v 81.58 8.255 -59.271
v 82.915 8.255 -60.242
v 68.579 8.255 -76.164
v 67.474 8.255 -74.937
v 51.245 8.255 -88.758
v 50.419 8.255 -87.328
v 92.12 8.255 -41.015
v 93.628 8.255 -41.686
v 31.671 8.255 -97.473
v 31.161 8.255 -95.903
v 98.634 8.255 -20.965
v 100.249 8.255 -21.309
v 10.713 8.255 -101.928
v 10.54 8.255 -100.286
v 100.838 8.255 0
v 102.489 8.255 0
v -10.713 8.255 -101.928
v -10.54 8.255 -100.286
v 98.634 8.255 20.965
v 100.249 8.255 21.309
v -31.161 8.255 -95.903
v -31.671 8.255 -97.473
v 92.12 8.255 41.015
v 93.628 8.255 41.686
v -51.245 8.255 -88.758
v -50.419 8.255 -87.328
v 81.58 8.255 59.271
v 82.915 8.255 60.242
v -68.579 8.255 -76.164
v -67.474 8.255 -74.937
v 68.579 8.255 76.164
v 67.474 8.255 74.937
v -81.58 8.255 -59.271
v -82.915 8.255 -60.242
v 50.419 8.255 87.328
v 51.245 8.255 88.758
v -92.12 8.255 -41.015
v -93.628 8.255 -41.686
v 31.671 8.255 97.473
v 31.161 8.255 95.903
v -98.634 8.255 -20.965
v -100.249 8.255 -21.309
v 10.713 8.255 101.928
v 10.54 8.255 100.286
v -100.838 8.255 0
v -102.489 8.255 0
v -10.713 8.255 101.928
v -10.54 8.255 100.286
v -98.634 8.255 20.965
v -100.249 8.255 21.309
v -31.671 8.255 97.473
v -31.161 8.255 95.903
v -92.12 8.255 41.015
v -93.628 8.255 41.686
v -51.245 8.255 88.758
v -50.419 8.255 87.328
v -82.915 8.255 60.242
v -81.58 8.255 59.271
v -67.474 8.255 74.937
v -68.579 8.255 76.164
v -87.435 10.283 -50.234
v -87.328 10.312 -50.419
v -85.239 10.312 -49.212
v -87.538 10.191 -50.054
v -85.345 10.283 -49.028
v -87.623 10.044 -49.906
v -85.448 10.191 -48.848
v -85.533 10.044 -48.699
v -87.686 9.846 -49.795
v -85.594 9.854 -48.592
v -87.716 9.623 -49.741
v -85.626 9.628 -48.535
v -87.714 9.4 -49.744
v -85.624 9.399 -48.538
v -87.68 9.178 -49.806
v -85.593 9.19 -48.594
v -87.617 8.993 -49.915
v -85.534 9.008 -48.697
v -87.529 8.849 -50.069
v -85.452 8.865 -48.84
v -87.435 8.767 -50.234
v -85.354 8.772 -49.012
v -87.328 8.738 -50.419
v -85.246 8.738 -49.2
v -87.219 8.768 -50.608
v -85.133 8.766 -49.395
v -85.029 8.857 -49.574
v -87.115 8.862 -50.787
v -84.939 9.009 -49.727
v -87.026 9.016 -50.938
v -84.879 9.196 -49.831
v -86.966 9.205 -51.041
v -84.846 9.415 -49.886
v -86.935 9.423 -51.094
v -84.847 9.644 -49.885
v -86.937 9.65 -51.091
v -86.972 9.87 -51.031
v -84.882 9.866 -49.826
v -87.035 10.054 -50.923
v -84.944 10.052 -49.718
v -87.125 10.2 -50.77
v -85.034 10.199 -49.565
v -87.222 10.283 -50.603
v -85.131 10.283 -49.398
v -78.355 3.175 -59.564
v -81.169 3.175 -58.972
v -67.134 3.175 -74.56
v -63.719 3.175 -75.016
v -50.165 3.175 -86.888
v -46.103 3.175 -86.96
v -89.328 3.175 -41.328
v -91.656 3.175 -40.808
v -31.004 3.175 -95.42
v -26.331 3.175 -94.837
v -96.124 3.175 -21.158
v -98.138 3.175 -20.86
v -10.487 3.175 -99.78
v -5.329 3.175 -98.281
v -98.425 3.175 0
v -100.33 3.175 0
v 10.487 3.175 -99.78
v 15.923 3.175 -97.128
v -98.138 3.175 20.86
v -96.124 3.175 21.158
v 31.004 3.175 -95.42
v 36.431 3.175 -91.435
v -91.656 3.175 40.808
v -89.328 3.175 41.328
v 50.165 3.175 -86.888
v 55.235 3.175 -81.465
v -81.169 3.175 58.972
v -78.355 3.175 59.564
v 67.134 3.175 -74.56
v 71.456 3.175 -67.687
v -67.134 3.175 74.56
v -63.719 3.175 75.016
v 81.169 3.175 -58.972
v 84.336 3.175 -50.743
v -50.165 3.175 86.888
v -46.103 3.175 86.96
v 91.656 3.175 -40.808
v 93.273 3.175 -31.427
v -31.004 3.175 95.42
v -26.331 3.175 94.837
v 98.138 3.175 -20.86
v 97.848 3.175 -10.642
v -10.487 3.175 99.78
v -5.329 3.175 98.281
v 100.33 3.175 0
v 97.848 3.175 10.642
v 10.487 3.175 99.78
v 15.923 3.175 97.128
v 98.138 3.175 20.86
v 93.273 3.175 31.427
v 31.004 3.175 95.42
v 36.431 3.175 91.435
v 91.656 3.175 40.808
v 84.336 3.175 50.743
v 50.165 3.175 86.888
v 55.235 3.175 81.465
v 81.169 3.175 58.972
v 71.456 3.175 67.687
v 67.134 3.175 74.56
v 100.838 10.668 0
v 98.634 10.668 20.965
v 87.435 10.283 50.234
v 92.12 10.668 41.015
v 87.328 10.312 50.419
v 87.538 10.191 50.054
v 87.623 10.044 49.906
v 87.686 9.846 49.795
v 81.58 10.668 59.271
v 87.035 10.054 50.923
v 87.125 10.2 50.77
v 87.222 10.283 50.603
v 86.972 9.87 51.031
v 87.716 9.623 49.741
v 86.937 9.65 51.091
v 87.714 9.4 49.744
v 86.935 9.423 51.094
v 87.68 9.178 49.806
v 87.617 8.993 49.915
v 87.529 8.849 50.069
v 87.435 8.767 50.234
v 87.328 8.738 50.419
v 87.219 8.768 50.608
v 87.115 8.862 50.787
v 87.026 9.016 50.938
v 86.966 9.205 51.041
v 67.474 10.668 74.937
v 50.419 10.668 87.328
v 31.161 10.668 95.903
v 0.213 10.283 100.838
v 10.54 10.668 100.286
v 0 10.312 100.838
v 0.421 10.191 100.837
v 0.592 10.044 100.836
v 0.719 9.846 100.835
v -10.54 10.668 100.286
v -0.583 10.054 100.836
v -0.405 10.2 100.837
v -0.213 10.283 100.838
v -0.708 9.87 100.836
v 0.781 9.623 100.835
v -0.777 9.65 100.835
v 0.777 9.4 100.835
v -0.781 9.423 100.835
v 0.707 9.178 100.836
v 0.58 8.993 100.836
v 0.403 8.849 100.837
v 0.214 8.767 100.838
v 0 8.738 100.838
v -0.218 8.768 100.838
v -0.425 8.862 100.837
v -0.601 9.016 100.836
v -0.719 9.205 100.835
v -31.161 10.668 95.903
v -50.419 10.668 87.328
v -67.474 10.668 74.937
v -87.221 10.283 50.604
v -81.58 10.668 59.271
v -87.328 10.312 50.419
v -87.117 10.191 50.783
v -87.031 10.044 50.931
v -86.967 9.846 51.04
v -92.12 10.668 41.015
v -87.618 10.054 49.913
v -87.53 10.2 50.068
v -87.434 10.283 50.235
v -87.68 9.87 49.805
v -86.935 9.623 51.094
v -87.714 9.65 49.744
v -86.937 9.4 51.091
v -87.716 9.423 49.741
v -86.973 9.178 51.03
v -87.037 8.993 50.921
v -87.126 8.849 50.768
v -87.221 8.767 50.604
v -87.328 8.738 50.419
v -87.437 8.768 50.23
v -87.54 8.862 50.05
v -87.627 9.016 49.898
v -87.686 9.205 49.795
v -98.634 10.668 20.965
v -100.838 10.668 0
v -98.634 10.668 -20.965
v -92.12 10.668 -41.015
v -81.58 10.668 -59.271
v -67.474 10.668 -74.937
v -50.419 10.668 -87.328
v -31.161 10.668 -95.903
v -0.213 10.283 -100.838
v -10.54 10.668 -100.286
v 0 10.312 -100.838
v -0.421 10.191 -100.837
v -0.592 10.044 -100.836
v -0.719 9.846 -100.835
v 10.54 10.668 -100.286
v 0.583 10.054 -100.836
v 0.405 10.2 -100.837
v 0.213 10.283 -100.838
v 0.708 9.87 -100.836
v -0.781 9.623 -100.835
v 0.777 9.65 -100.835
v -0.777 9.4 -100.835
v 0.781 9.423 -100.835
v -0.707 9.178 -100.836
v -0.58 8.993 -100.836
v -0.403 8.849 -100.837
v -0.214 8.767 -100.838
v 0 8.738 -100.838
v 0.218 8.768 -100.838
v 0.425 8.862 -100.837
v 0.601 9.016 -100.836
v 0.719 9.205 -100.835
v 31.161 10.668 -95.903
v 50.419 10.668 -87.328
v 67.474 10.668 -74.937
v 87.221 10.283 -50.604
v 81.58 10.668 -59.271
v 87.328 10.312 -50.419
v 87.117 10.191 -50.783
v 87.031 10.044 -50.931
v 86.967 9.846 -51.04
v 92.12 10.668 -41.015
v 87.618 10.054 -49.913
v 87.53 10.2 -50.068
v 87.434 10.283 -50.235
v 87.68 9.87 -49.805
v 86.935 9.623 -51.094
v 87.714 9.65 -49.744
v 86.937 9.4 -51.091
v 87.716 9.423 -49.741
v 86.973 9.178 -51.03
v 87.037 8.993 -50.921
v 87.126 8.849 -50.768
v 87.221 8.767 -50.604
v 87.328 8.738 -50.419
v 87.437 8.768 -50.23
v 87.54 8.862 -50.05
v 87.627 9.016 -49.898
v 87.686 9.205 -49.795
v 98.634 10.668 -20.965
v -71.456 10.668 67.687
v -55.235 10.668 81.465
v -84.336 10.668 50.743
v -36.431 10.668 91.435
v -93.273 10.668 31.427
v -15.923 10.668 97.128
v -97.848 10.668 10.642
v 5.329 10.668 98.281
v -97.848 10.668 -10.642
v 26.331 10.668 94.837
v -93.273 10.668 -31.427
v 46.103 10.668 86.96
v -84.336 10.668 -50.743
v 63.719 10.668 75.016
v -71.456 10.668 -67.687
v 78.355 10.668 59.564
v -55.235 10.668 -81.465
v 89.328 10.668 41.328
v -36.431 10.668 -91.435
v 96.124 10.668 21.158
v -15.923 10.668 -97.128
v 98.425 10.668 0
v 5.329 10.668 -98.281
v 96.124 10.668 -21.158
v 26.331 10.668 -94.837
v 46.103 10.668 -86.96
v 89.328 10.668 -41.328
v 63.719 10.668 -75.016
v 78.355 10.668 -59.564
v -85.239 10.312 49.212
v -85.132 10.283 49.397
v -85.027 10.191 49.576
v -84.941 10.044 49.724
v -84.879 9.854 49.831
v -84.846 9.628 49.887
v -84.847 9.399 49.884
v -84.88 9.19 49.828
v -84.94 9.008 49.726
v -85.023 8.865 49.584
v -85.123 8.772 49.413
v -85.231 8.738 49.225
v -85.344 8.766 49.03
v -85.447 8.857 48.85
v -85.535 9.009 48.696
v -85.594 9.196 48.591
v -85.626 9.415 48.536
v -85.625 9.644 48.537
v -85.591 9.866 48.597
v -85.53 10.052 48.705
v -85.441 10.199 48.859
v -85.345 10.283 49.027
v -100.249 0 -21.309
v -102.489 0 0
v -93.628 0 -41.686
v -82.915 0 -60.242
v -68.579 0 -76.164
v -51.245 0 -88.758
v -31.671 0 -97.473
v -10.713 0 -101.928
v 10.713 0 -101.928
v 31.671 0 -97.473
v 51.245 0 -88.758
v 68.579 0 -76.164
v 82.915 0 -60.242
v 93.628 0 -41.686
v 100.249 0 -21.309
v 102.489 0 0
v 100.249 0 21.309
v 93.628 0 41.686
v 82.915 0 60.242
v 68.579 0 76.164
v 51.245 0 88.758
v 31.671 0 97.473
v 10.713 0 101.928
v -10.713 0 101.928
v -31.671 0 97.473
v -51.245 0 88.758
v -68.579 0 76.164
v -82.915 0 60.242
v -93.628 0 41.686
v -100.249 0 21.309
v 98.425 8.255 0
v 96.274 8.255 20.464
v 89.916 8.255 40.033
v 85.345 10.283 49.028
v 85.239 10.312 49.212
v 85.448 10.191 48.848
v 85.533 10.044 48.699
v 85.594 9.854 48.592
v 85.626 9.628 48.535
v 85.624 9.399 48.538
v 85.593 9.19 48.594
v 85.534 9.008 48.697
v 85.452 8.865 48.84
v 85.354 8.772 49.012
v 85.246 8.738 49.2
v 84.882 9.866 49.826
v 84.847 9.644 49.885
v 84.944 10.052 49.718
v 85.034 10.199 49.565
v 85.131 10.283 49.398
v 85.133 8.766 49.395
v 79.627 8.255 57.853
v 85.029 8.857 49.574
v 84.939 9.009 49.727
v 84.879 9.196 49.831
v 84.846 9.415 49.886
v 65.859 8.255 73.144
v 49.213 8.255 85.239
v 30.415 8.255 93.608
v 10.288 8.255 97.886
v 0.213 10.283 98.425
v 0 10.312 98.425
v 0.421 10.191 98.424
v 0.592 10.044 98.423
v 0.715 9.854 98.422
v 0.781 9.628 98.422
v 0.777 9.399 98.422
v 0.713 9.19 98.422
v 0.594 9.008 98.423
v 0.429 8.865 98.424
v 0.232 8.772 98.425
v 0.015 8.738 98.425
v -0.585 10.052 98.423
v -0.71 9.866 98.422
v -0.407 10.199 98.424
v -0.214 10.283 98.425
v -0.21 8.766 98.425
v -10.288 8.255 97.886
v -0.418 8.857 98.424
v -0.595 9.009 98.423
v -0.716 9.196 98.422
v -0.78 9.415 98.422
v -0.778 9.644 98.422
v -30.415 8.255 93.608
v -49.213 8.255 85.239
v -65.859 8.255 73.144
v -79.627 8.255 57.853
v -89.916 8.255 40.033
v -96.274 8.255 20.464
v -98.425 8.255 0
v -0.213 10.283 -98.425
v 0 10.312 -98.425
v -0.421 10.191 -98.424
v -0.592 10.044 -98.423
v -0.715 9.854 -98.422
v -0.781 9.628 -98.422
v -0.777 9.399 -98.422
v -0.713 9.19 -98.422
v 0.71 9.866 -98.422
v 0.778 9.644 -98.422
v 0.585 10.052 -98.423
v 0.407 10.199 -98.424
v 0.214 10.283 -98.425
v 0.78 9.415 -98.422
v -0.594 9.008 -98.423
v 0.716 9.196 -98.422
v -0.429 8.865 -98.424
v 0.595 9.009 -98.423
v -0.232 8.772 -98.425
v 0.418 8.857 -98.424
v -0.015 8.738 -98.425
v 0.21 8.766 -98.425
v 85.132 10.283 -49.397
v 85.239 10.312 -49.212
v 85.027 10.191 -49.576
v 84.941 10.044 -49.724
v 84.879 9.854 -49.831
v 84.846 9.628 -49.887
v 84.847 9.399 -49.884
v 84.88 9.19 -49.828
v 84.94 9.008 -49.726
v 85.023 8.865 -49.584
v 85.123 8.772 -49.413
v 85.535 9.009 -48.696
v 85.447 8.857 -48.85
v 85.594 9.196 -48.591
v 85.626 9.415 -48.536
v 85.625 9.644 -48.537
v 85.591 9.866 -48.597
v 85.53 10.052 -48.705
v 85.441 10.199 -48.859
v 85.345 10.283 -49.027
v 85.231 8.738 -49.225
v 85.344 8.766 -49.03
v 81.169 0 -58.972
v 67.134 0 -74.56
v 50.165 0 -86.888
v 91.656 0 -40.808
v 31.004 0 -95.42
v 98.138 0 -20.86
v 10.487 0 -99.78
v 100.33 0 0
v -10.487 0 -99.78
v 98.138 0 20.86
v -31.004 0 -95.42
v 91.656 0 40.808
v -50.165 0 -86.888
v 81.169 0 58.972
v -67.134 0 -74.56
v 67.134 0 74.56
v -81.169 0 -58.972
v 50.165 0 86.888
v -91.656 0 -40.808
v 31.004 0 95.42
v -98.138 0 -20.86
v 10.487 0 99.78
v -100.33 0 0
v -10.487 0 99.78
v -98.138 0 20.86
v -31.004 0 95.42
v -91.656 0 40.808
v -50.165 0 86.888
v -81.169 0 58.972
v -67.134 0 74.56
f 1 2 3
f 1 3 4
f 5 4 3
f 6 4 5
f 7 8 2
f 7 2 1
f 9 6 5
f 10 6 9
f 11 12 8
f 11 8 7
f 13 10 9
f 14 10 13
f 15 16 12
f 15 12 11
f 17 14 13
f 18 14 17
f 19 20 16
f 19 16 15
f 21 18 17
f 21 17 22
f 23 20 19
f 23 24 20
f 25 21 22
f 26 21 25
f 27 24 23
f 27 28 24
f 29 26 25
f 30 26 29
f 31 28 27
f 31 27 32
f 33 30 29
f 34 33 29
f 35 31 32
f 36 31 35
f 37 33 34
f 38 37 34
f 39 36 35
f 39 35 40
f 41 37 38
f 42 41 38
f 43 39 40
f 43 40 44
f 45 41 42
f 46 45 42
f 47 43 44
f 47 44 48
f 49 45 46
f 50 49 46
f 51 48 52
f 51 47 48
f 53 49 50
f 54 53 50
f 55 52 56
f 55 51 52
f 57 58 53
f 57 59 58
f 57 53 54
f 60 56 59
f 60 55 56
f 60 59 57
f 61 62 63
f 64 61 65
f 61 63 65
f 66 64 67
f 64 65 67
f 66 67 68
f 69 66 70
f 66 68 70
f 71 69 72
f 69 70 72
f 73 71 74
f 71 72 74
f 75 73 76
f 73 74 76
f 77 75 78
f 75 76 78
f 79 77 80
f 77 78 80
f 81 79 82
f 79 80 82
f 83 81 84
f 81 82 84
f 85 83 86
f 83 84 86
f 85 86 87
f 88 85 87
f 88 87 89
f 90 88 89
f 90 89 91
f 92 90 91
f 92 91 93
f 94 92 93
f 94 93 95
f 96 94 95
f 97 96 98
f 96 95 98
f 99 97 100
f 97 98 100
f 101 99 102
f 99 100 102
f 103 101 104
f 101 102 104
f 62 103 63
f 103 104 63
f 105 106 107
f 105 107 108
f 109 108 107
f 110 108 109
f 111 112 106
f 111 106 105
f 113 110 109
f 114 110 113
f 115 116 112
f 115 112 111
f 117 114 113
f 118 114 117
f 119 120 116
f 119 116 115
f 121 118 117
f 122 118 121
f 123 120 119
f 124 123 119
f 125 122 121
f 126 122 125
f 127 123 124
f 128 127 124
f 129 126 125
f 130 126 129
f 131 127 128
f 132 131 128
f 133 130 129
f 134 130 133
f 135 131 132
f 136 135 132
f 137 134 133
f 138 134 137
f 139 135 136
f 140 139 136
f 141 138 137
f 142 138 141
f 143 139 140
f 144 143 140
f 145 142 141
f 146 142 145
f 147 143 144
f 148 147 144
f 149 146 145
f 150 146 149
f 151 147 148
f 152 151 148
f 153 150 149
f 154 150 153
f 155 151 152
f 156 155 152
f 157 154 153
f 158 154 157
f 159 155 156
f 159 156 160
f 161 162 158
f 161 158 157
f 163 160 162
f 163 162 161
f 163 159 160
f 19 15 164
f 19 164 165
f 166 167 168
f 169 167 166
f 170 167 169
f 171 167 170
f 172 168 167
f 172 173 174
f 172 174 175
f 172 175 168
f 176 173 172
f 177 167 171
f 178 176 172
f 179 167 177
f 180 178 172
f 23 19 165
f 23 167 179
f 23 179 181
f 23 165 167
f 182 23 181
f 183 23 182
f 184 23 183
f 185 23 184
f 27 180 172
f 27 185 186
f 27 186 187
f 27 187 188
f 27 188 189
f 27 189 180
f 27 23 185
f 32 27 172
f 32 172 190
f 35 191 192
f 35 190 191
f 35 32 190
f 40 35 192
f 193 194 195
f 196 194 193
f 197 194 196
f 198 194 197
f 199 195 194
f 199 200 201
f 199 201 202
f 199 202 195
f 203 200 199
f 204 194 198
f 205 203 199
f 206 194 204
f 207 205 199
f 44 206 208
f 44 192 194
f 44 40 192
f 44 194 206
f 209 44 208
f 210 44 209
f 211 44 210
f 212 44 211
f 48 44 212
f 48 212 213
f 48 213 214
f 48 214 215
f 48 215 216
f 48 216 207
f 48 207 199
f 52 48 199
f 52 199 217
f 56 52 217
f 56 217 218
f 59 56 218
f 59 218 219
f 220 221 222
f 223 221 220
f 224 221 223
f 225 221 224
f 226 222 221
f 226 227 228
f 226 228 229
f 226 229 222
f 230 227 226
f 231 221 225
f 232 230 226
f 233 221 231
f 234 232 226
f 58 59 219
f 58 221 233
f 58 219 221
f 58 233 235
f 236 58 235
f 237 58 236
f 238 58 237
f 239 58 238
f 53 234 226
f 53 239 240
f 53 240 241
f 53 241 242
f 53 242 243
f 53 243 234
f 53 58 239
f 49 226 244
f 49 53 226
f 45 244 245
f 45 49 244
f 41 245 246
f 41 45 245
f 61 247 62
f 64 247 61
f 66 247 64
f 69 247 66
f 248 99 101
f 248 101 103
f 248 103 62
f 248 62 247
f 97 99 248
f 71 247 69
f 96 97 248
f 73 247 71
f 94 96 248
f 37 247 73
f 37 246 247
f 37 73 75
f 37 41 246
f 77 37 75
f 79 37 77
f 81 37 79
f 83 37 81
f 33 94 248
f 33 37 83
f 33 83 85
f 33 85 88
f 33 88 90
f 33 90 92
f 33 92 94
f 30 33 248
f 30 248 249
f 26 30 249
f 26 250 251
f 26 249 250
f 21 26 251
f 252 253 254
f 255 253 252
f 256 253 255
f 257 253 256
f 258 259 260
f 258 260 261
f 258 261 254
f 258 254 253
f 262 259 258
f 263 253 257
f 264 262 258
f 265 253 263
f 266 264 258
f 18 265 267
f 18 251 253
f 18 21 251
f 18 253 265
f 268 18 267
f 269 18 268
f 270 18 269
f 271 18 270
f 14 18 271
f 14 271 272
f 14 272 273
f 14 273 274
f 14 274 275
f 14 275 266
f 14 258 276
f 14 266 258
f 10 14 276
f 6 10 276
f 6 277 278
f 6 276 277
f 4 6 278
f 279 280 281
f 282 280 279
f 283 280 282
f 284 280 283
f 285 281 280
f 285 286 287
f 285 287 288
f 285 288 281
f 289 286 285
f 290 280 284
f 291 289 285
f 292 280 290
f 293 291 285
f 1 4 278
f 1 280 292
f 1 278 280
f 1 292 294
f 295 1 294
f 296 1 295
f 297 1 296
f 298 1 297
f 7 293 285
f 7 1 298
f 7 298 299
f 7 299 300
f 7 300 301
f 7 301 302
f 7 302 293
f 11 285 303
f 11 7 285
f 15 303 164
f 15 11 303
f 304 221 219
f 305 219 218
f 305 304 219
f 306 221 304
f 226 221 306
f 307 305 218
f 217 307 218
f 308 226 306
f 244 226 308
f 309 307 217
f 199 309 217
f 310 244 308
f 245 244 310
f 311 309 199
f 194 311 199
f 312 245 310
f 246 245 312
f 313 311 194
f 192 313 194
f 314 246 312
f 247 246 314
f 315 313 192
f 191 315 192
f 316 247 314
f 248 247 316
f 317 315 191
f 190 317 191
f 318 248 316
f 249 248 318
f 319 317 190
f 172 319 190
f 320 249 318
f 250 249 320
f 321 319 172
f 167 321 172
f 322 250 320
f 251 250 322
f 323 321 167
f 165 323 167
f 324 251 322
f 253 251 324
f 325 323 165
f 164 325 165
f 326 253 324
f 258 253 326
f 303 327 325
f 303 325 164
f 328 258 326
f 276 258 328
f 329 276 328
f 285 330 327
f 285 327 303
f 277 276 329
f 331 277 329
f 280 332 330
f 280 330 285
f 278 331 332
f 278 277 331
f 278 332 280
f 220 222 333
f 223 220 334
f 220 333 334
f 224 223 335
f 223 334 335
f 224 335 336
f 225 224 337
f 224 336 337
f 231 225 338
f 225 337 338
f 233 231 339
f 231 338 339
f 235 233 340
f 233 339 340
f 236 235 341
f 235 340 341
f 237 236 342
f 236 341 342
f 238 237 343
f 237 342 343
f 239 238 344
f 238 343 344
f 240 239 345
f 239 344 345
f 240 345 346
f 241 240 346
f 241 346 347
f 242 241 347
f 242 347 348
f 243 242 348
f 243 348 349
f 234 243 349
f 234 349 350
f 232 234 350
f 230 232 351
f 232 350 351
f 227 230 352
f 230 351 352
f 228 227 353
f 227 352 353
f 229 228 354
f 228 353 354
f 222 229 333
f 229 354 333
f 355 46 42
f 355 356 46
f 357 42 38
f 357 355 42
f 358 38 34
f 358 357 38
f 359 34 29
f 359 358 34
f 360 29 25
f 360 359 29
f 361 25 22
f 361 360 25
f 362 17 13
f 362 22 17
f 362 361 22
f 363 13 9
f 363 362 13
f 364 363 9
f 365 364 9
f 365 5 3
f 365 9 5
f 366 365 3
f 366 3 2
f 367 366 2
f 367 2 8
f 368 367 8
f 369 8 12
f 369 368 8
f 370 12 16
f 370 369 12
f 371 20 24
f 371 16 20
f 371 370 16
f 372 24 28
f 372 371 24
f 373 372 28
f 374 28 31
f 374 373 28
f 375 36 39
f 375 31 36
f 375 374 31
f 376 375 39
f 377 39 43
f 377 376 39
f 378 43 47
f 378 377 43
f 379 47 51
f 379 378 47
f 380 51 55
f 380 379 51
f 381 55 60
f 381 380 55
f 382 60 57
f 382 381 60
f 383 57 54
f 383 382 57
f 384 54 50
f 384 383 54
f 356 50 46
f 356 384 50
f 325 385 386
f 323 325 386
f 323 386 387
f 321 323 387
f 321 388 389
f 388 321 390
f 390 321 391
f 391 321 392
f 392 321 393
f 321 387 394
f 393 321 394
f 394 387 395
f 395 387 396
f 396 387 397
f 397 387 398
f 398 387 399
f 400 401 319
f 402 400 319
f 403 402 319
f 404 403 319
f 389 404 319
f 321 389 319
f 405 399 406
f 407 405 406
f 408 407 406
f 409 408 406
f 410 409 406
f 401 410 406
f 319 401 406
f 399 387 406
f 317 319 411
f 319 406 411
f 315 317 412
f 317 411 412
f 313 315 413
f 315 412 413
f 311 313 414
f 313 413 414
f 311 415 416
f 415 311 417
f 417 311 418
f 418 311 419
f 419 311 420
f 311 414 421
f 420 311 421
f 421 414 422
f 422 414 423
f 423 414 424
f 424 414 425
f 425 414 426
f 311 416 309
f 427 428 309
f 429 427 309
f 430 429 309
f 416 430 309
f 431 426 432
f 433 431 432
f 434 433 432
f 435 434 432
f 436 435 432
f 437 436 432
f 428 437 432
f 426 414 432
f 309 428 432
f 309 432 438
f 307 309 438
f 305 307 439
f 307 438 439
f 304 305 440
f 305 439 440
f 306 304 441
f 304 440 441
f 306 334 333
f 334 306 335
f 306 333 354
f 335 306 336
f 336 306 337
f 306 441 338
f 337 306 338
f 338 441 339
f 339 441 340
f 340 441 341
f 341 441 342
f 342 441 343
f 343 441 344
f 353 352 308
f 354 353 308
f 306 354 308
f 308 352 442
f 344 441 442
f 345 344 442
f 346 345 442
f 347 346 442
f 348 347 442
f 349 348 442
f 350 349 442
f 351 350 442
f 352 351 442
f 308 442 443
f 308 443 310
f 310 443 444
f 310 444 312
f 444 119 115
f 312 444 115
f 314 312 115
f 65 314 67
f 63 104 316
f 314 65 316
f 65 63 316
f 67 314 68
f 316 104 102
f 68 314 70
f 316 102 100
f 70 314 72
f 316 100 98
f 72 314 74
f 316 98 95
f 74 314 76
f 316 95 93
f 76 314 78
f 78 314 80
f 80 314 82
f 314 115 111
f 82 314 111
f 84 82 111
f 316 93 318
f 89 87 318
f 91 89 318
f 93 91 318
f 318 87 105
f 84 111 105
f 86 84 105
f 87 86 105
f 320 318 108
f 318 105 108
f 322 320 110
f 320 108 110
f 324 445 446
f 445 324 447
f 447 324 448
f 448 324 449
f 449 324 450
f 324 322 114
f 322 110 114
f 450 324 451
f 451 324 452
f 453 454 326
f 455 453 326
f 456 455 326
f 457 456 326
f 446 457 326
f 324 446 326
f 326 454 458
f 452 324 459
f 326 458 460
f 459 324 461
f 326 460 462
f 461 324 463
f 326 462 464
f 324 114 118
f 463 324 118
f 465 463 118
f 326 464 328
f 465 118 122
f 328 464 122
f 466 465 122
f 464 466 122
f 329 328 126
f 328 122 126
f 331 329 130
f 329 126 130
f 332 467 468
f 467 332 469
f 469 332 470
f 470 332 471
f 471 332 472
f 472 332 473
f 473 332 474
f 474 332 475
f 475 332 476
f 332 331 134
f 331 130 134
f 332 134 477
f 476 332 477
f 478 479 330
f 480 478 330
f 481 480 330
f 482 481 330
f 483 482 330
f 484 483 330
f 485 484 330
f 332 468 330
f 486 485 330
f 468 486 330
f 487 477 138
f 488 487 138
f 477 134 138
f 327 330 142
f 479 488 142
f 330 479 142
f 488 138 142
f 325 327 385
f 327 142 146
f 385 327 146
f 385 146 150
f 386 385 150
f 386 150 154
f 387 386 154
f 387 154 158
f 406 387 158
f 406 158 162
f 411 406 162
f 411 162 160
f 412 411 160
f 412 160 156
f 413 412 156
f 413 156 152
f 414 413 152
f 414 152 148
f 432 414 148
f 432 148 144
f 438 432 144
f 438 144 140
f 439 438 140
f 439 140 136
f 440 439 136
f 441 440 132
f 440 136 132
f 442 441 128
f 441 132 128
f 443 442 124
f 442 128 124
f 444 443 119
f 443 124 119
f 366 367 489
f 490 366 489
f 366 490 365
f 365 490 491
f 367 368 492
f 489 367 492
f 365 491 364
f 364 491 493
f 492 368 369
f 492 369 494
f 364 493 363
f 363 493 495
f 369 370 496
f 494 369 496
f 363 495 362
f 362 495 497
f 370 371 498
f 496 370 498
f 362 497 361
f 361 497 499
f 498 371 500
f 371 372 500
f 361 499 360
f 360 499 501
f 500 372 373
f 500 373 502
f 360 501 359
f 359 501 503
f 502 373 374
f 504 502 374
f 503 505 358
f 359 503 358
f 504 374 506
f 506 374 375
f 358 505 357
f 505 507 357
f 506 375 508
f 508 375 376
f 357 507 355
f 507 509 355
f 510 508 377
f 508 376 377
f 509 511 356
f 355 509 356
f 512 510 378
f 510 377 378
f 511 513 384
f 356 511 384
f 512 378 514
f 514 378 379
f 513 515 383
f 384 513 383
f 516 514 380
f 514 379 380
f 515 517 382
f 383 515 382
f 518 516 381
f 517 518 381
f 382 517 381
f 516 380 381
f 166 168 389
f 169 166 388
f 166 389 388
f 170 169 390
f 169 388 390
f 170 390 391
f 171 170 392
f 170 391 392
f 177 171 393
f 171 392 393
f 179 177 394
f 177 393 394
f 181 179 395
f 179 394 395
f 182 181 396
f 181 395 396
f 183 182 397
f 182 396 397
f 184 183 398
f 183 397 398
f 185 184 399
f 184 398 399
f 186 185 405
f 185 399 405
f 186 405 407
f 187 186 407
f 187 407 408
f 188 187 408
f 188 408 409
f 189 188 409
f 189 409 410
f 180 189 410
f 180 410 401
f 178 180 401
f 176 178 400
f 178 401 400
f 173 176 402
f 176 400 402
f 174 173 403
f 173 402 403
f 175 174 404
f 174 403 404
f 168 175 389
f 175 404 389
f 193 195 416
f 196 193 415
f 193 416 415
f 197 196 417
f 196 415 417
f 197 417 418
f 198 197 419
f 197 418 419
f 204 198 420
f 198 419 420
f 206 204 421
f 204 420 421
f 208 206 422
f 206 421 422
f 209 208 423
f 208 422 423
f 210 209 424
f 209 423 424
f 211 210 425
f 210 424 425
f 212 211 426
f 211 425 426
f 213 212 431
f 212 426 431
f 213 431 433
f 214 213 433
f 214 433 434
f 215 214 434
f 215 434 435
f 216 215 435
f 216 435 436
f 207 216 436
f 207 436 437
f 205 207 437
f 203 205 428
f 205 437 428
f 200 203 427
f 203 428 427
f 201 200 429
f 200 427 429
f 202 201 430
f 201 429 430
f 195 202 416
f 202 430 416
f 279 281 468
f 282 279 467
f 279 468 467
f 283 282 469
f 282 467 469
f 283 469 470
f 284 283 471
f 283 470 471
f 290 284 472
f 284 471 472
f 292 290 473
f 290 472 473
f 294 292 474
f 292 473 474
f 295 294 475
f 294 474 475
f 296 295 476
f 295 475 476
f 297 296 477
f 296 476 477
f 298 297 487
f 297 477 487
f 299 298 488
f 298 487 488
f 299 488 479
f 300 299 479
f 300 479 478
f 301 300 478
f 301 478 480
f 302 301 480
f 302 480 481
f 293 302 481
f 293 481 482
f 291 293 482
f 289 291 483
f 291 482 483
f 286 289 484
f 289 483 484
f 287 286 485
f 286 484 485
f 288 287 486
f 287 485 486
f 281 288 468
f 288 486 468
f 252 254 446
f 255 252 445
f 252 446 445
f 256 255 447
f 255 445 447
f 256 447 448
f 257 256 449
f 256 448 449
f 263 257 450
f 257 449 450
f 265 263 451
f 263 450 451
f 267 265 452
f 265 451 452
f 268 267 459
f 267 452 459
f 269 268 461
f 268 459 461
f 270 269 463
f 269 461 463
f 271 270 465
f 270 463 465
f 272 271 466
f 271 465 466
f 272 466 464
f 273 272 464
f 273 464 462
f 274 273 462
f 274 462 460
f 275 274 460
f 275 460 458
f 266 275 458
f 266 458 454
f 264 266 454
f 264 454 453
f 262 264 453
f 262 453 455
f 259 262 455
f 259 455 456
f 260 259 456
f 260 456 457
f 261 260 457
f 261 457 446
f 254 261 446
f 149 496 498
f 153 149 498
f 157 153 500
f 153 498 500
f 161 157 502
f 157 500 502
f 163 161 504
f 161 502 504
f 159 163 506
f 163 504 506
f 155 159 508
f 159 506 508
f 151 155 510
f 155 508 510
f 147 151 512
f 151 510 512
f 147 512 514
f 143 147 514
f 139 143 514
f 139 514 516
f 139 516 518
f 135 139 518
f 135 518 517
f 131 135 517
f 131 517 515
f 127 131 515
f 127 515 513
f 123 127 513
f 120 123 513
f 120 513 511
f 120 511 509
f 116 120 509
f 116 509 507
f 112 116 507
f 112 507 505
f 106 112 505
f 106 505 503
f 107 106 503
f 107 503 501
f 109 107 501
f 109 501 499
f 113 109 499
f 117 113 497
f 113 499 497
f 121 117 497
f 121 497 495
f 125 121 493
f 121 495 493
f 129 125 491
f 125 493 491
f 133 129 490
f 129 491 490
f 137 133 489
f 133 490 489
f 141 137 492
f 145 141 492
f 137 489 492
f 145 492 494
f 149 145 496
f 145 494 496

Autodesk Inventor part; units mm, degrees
ref_plane "YZ Plane" through (0, 0, 0) normal (1, 0, 0) x (0, 1, 0)
ref_plane "XZ Plane" through (0, 0, 0) normal (0, 1, 0) x (-1, 0, 0)
sketch "Sketch1" plane through (0, 0, 0) normal (0, 1, 0) x (-1, 0, 0)
  circle A0 centre (0, 0) radius 98.425
  circle A1 centre (0, 0) radius 102.489
  dimension "d0" = 196.85
  dimension "d1" = 4.064
extrude "Extrusion1" add sketch "Sketch1" along normal blind 8.255
sketch "Sketch2" plane through (0, 8.255, 0) normal (0, 1, 0) x (1, 0, 0)
  circle A0 centre (0, 0) radius 98.425
  circle A1 centre (0, 0) radius 98.425 projected
  circle A2 centre (0, 0) radius 100.838
  dimension "d4" = 2.413
extrude "Extrusion2" add sketch "Sketch2" along normal blind 2.413
ref_plane "Work Plane1" through (0, 8.255, -100.838) normal (0, 0, 1) x (1, 0, 0)
sketch "Sketch3" plane through (0, 8.255, -100.838) normal (0, 0, 1) x (1, 0, 0)
  line L0 (102.489, 0) -> (-102.489, 0) construction
  line L1 (0, 0) -> (0, 1.27) construction
  point P0 (0, -8.255)
  dimension "d7" = 1.27
hole "Hole1" at (0, 9.525, -100.838) direction (0, 0, 1) diameter 1.5748 depth 6.2992 tip angle 118
pattern_circular "Circular Pattern1" count 6 over 360 about axis through (0, 0, 0) along (0, 1, 0) of "Hole1"
sketch "Sketch4" plane through (0, 0, 0) normal (0, -1, 0) x (1, 0, 0)
  circle A0 centre (0, 0) radius 100.33
  dimension "d18" = 200.66
extrude "Extrusion3" cut sketch "Sketch4" against normal blind 3.175
properties part number "4K sheild rim3" material "Brass, Soft Yellow"
